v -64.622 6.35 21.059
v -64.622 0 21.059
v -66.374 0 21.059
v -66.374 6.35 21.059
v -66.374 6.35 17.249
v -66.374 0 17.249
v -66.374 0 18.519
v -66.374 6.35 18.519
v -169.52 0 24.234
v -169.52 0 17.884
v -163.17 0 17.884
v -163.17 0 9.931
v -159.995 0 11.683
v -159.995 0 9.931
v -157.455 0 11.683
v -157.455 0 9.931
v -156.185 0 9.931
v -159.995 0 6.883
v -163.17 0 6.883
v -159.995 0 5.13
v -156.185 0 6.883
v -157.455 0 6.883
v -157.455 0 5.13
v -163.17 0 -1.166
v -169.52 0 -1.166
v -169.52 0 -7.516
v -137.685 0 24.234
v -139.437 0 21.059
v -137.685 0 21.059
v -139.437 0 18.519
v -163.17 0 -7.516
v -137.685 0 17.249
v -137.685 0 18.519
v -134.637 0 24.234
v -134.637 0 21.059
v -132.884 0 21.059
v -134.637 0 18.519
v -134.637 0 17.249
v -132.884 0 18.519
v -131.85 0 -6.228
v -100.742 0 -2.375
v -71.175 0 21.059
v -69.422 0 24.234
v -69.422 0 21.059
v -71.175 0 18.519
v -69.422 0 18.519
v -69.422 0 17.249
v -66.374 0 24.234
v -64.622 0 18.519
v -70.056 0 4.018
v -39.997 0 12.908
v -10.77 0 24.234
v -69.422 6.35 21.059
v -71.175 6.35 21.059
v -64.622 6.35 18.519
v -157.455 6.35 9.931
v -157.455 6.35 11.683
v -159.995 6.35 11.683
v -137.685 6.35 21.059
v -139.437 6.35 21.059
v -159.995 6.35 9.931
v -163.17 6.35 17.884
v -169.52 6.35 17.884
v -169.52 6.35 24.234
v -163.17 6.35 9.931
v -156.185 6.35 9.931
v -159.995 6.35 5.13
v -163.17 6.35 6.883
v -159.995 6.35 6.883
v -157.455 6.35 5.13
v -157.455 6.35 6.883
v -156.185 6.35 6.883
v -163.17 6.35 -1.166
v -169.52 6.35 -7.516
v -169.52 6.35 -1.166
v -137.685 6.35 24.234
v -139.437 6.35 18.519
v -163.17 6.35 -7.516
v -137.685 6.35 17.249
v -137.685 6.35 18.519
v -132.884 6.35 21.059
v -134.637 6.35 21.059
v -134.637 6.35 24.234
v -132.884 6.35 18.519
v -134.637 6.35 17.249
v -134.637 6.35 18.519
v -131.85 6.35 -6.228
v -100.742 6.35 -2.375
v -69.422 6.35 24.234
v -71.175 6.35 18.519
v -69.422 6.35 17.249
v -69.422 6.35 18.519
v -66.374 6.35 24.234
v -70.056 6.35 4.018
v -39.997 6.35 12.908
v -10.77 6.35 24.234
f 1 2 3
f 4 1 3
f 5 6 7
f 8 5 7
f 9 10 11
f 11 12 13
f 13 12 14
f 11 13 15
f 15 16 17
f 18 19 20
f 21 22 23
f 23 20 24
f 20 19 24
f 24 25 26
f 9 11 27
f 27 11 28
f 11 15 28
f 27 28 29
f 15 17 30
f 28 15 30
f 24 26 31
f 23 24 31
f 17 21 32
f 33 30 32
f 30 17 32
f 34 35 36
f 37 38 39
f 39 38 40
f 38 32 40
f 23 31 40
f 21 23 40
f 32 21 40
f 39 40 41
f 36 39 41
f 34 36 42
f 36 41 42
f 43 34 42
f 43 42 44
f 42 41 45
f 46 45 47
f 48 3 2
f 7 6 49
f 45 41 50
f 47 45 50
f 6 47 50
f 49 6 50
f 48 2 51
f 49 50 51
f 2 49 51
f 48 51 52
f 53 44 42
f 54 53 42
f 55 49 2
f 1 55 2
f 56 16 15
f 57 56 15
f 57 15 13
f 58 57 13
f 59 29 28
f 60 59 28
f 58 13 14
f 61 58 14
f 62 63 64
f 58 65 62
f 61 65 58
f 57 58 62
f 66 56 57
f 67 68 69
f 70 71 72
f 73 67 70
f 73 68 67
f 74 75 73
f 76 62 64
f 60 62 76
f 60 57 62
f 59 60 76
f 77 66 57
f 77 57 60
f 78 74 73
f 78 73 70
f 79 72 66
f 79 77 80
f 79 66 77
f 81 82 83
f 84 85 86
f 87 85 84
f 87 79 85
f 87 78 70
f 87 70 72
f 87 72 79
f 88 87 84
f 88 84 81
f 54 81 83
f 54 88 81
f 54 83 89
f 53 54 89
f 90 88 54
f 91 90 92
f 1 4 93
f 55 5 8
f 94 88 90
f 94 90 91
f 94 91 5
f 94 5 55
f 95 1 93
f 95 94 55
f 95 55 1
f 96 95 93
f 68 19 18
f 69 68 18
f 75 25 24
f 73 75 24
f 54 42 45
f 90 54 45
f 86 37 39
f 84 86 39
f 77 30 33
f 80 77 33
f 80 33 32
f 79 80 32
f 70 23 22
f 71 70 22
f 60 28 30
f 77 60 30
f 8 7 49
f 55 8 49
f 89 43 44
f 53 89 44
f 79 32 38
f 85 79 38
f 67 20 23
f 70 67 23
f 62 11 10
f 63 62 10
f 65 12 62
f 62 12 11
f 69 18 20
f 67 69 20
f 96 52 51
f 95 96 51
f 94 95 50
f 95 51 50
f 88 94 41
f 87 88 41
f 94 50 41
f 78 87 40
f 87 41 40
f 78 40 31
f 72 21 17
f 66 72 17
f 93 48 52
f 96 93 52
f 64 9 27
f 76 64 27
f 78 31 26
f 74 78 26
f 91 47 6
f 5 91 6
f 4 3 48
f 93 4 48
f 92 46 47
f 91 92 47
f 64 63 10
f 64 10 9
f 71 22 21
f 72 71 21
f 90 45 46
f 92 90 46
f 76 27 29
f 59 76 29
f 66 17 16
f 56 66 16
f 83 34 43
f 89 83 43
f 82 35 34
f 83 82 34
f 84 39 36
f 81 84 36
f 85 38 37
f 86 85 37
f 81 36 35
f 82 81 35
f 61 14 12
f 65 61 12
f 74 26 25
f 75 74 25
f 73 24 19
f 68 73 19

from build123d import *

# Parameters (mm, degrees)
BOSS_EXTRUDE1_DEPTH = 6.35


with BuildPart() as part:
    # Sketch1 → Boss-Extrude1 (new body)
    with BuildSketch(Plane(origin=(0, 0, 0), x_dir=(1, 0, 0), z_dir=(0, 1, 0))):
        with BuildLine():
            Line((-163.169535376, 1.165732309), (-163.169535376, -6.882681502))
            Line((-163.169535376, -6.882681502), (-159.994535376, -6.882681502))
            Line((-159.994535376, -6.882681502), (-159.994535376, -5.130081502))
            Line((-159.994535376, -5.130081502), (-157.454535376, -5.130081502))
            Line((-157.454535376, -5.130081502), (-157.454535376, -6.882681502))
            Line((-157.454535376, -6.882681502), (-156.184535376, -6.882681502))
            Line((-156.184535376, -6.882681502), (-156.184535376, -9.930540858))
            Line((-156.184535376, -9.930540858), (-157.454535376, -9.930540858))
            Line((-157.454535376, -9.930540858), (-157.454535376, -11.683140858))
            Line((-157.454535376, -11.683140858), (-159.994535376, -11.683140858))
            Line((-159.994535376, -11.683140858), (-159.994535376, -9.930540858))
            Line((-159.994535376, -9.930540858), (-163.169535376, -9.930540858))
            Line((-163.169535376, -9.930540858), (-163.169535376, -17.884267691))
            Line((-163.169535376, -17.884267691), (-169.519535376, -17.884267691))
            Line((-169.519535376, -17.884267691), (-169.519535376, -24.234267691))
            Line((-169.519535376, -24.234267691), (-137.68483349, -24.234267691))
            Line((-137.68483349, -24.234267691), (-137.68483349, -21.059267691))
            Line((-137.68483349, -21.059267691), (-139.43743349, -21.059267691))
            Line((-139.43743349, -21.059267691), (-139.43743349, -18.519267691))
            Line((-139.43743349, -18.519267691), (-137.68483349, -18.519267691))
            Line((-137.68483349, -18.519267691), (-137.68483349, -17.249267691))
            Line((-137.68483349, -17.249267691), (-134.636974134, -17.249267691))
            Line((-134.636974134, -17.249267691), (-134.636974134, -18.519267691))
            Line((-134.636974134, -18.519267691), (-132.884374134, -18.519267691))
            Line((-132.884374134, -18.519267691), (-132.884374134, -21.059267691))
            Line((-132.884374134, -21.059267691), (-134.636974134, -21.059267691))
            Line((-134.636974134, -21.059267691), (-134.636974134, -24.234267691))
            Line((-134.636974134, -24.234267691), (-69.42233349, -24.234267691))
            Line((-69.42233349, -24.234267691), (-69.42233349, -21.059267691))
            Line((-69.42233349, -21.059267691), (-71.17493349, -21.059267691))
            Line((-71.17493349, -21.059267691), (-71.17493349, -18.519267691))
            Line((-71.17493349, -18.519267691), (-69.42233349, -18.519267691))
            Line((-69.42233349, -18.519267691), (-69.42233349, -17.249267691))
            Line((-69.42233349, -17.249267691), (-66.374474134, -17.249267691))
            Line((-66.374474134, -17.249267691), (-66.374474134, -18.519267691))
            Line((-66.374474134, -18.519267691), (-64.621874134, -18.519267691))
            Line((-64.621874134, -18.519267691), (-64.621874134, -21.059267691))
            Line((-64.621874134, -21.059267691), (-66.374474134, -21.059267691))
            Line((-66.374474134, -21.059267691), (-66.374474134, -24.234267691))
            Line((-66.374474134, -24.234267691), (-10.769535376, -24.234267691))
            ThreePointArc((-10.769535376, -24.234267691), (-85.333453608, -0.506075205), (-163.169535376, 7.515732309))
            Line((-163.169535376, 7.515732309), (-169.519535376, 7.515732309))
            Line((-169.519535376, 7.515732309), (-169.519535376, 1.165732309))
            Line((-169.519535376, 1.165732309), (-163.169535376, 1.165732309))
        make_face()
    extrude(amount=BOSS_EXTRUDE1_DEPTH)


solid = part.part
